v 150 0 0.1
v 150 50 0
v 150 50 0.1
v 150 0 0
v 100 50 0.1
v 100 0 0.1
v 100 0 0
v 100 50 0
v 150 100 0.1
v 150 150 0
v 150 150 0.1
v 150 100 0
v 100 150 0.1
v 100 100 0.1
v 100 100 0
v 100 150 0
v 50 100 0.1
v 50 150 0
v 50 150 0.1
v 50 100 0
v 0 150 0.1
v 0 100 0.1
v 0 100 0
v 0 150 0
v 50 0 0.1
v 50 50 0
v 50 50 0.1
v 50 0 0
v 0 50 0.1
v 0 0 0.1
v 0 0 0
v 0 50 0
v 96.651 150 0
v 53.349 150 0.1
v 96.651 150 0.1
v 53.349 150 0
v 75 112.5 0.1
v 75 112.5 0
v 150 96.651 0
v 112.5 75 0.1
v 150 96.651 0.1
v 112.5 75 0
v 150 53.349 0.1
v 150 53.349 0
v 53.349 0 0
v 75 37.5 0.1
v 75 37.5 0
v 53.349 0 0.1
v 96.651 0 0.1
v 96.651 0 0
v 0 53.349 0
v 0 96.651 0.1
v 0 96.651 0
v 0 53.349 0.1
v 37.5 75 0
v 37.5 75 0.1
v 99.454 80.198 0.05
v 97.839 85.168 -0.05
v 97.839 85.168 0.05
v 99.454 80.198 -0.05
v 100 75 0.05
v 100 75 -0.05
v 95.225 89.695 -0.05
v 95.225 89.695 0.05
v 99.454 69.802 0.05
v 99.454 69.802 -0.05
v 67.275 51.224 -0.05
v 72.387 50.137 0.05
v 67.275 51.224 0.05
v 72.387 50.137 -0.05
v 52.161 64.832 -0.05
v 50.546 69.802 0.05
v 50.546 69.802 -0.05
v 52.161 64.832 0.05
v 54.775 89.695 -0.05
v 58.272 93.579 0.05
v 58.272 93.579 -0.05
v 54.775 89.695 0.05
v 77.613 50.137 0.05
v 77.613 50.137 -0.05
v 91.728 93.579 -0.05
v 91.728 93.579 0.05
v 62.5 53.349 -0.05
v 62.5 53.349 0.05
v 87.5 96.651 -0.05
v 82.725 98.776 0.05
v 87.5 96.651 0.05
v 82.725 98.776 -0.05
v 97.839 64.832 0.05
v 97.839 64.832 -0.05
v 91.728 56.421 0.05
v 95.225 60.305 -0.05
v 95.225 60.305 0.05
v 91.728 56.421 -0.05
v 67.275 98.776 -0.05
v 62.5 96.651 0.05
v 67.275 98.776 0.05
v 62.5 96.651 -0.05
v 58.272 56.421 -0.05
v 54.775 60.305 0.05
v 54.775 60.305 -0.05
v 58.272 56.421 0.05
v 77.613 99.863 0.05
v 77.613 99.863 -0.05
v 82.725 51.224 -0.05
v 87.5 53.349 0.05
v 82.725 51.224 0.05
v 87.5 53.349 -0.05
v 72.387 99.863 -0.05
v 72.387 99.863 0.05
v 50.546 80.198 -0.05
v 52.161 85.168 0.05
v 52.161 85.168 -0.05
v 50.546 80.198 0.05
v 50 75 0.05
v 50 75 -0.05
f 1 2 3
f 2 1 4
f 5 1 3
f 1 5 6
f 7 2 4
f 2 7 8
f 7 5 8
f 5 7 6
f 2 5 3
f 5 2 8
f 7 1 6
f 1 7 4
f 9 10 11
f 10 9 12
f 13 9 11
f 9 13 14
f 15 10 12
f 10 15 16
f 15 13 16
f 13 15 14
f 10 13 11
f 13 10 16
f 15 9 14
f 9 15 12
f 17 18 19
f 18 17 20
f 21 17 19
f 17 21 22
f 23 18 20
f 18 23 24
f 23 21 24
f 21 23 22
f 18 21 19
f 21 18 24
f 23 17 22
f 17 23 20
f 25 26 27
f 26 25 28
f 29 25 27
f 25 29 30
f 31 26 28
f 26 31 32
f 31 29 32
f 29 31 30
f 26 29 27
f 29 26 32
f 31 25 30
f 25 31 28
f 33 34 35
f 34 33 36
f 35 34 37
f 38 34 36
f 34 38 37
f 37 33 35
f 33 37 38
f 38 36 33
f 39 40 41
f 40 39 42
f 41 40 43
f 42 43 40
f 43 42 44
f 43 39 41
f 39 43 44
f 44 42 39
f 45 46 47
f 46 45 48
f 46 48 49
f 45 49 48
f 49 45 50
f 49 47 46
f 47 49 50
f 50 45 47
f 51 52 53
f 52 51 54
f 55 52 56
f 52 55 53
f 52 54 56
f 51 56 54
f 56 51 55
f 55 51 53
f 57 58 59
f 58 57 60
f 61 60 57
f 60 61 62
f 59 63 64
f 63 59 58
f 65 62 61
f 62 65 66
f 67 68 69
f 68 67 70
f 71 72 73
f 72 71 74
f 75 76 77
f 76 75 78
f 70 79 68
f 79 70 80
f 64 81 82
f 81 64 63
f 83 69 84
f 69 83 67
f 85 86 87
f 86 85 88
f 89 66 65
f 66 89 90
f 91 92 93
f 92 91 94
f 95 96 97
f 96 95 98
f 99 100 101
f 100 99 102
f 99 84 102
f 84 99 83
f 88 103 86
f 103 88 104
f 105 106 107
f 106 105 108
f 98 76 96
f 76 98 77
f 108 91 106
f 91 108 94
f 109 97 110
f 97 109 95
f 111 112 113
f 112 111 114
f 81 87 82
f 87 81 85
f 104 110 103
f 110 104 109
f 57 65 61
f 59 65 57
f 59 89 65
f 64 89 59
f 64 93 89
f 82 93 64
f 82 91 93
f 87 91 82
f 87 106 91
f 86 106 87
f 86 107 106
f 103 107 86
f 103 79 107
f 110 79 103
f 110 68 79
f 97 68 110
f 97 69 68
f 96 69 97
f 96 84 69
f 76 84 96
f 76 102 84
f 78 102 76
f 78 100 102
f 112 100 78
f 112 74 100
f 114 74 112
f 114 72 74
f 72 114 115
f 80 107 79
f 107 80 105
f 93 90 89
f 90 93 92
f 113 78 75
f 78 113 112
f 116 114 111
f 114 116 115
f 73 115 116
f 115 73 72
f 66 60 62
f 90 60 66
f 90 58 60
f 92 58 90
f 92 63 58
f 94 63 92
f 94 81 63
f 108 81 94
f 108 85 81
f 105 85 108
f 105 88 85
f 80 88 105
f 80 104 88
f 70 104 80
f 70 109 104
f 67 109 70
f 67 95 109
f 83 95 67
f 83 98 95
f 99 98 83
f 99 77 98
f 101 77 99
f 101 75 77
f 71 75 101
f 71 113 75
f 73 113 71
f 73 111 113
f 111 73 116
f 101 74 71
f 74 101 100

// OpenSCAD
bed_max_x = 150;
bed_max_y = 150;
plate_size = 50;
height = .1;
triangle_factor = 1.25;

module four_corners() {
    translate([bed_max_x-plate_size,0,0]){
        cube([plate_size,plate_size,height]);
    }
    translate([bed_max_x-plate_size,bed_max_y-plate_size,0]){
        cube([plate_size,plate_size,height]);
    }

    translate([0,bed_max_y-plate_size,0]){
        cube([plate_size,plate_size,height]);
    }

    cube([plate_size,plate_size,height]);
}

module edge_triangles() {
    translate([bed_max_x/2,bed_max_y/2,0]) {
        
        translate([0,plate_size*triangle_factor,0]){
            rotate([0,0,30]) {
                cylinder(r=plate_size/2, h=height, $fn=3);
            }
        }
        
        translate([plate_size*triangle_factor,0,0]){
            rotate([0,0,60]) {
                cylinder(r=plate_size/2, h=height, $fn=3);
            }
        }

        translate([0,(plate_size*triangle_factor)*-1,0]){
            rotate([0,0,90]) {
                cylinder(r=plate_size/2, h=height, $fn=3);
            }
        }

        translate([(plate_size*triangle_factor)*-1,0,0]){
            rotate([0,0,0]) {
                cylinder(r=plate_size/2, h=height, $fn=3);
            }
        }

    }
    
}


module center_point() {
    translate([bed_max_x/2,bed_max_y/2,0]) {
        cylinder(r=plate_size/2, h=height, center=true);
    }
}
    
four_corners();
center_point();
edge_triangles();

